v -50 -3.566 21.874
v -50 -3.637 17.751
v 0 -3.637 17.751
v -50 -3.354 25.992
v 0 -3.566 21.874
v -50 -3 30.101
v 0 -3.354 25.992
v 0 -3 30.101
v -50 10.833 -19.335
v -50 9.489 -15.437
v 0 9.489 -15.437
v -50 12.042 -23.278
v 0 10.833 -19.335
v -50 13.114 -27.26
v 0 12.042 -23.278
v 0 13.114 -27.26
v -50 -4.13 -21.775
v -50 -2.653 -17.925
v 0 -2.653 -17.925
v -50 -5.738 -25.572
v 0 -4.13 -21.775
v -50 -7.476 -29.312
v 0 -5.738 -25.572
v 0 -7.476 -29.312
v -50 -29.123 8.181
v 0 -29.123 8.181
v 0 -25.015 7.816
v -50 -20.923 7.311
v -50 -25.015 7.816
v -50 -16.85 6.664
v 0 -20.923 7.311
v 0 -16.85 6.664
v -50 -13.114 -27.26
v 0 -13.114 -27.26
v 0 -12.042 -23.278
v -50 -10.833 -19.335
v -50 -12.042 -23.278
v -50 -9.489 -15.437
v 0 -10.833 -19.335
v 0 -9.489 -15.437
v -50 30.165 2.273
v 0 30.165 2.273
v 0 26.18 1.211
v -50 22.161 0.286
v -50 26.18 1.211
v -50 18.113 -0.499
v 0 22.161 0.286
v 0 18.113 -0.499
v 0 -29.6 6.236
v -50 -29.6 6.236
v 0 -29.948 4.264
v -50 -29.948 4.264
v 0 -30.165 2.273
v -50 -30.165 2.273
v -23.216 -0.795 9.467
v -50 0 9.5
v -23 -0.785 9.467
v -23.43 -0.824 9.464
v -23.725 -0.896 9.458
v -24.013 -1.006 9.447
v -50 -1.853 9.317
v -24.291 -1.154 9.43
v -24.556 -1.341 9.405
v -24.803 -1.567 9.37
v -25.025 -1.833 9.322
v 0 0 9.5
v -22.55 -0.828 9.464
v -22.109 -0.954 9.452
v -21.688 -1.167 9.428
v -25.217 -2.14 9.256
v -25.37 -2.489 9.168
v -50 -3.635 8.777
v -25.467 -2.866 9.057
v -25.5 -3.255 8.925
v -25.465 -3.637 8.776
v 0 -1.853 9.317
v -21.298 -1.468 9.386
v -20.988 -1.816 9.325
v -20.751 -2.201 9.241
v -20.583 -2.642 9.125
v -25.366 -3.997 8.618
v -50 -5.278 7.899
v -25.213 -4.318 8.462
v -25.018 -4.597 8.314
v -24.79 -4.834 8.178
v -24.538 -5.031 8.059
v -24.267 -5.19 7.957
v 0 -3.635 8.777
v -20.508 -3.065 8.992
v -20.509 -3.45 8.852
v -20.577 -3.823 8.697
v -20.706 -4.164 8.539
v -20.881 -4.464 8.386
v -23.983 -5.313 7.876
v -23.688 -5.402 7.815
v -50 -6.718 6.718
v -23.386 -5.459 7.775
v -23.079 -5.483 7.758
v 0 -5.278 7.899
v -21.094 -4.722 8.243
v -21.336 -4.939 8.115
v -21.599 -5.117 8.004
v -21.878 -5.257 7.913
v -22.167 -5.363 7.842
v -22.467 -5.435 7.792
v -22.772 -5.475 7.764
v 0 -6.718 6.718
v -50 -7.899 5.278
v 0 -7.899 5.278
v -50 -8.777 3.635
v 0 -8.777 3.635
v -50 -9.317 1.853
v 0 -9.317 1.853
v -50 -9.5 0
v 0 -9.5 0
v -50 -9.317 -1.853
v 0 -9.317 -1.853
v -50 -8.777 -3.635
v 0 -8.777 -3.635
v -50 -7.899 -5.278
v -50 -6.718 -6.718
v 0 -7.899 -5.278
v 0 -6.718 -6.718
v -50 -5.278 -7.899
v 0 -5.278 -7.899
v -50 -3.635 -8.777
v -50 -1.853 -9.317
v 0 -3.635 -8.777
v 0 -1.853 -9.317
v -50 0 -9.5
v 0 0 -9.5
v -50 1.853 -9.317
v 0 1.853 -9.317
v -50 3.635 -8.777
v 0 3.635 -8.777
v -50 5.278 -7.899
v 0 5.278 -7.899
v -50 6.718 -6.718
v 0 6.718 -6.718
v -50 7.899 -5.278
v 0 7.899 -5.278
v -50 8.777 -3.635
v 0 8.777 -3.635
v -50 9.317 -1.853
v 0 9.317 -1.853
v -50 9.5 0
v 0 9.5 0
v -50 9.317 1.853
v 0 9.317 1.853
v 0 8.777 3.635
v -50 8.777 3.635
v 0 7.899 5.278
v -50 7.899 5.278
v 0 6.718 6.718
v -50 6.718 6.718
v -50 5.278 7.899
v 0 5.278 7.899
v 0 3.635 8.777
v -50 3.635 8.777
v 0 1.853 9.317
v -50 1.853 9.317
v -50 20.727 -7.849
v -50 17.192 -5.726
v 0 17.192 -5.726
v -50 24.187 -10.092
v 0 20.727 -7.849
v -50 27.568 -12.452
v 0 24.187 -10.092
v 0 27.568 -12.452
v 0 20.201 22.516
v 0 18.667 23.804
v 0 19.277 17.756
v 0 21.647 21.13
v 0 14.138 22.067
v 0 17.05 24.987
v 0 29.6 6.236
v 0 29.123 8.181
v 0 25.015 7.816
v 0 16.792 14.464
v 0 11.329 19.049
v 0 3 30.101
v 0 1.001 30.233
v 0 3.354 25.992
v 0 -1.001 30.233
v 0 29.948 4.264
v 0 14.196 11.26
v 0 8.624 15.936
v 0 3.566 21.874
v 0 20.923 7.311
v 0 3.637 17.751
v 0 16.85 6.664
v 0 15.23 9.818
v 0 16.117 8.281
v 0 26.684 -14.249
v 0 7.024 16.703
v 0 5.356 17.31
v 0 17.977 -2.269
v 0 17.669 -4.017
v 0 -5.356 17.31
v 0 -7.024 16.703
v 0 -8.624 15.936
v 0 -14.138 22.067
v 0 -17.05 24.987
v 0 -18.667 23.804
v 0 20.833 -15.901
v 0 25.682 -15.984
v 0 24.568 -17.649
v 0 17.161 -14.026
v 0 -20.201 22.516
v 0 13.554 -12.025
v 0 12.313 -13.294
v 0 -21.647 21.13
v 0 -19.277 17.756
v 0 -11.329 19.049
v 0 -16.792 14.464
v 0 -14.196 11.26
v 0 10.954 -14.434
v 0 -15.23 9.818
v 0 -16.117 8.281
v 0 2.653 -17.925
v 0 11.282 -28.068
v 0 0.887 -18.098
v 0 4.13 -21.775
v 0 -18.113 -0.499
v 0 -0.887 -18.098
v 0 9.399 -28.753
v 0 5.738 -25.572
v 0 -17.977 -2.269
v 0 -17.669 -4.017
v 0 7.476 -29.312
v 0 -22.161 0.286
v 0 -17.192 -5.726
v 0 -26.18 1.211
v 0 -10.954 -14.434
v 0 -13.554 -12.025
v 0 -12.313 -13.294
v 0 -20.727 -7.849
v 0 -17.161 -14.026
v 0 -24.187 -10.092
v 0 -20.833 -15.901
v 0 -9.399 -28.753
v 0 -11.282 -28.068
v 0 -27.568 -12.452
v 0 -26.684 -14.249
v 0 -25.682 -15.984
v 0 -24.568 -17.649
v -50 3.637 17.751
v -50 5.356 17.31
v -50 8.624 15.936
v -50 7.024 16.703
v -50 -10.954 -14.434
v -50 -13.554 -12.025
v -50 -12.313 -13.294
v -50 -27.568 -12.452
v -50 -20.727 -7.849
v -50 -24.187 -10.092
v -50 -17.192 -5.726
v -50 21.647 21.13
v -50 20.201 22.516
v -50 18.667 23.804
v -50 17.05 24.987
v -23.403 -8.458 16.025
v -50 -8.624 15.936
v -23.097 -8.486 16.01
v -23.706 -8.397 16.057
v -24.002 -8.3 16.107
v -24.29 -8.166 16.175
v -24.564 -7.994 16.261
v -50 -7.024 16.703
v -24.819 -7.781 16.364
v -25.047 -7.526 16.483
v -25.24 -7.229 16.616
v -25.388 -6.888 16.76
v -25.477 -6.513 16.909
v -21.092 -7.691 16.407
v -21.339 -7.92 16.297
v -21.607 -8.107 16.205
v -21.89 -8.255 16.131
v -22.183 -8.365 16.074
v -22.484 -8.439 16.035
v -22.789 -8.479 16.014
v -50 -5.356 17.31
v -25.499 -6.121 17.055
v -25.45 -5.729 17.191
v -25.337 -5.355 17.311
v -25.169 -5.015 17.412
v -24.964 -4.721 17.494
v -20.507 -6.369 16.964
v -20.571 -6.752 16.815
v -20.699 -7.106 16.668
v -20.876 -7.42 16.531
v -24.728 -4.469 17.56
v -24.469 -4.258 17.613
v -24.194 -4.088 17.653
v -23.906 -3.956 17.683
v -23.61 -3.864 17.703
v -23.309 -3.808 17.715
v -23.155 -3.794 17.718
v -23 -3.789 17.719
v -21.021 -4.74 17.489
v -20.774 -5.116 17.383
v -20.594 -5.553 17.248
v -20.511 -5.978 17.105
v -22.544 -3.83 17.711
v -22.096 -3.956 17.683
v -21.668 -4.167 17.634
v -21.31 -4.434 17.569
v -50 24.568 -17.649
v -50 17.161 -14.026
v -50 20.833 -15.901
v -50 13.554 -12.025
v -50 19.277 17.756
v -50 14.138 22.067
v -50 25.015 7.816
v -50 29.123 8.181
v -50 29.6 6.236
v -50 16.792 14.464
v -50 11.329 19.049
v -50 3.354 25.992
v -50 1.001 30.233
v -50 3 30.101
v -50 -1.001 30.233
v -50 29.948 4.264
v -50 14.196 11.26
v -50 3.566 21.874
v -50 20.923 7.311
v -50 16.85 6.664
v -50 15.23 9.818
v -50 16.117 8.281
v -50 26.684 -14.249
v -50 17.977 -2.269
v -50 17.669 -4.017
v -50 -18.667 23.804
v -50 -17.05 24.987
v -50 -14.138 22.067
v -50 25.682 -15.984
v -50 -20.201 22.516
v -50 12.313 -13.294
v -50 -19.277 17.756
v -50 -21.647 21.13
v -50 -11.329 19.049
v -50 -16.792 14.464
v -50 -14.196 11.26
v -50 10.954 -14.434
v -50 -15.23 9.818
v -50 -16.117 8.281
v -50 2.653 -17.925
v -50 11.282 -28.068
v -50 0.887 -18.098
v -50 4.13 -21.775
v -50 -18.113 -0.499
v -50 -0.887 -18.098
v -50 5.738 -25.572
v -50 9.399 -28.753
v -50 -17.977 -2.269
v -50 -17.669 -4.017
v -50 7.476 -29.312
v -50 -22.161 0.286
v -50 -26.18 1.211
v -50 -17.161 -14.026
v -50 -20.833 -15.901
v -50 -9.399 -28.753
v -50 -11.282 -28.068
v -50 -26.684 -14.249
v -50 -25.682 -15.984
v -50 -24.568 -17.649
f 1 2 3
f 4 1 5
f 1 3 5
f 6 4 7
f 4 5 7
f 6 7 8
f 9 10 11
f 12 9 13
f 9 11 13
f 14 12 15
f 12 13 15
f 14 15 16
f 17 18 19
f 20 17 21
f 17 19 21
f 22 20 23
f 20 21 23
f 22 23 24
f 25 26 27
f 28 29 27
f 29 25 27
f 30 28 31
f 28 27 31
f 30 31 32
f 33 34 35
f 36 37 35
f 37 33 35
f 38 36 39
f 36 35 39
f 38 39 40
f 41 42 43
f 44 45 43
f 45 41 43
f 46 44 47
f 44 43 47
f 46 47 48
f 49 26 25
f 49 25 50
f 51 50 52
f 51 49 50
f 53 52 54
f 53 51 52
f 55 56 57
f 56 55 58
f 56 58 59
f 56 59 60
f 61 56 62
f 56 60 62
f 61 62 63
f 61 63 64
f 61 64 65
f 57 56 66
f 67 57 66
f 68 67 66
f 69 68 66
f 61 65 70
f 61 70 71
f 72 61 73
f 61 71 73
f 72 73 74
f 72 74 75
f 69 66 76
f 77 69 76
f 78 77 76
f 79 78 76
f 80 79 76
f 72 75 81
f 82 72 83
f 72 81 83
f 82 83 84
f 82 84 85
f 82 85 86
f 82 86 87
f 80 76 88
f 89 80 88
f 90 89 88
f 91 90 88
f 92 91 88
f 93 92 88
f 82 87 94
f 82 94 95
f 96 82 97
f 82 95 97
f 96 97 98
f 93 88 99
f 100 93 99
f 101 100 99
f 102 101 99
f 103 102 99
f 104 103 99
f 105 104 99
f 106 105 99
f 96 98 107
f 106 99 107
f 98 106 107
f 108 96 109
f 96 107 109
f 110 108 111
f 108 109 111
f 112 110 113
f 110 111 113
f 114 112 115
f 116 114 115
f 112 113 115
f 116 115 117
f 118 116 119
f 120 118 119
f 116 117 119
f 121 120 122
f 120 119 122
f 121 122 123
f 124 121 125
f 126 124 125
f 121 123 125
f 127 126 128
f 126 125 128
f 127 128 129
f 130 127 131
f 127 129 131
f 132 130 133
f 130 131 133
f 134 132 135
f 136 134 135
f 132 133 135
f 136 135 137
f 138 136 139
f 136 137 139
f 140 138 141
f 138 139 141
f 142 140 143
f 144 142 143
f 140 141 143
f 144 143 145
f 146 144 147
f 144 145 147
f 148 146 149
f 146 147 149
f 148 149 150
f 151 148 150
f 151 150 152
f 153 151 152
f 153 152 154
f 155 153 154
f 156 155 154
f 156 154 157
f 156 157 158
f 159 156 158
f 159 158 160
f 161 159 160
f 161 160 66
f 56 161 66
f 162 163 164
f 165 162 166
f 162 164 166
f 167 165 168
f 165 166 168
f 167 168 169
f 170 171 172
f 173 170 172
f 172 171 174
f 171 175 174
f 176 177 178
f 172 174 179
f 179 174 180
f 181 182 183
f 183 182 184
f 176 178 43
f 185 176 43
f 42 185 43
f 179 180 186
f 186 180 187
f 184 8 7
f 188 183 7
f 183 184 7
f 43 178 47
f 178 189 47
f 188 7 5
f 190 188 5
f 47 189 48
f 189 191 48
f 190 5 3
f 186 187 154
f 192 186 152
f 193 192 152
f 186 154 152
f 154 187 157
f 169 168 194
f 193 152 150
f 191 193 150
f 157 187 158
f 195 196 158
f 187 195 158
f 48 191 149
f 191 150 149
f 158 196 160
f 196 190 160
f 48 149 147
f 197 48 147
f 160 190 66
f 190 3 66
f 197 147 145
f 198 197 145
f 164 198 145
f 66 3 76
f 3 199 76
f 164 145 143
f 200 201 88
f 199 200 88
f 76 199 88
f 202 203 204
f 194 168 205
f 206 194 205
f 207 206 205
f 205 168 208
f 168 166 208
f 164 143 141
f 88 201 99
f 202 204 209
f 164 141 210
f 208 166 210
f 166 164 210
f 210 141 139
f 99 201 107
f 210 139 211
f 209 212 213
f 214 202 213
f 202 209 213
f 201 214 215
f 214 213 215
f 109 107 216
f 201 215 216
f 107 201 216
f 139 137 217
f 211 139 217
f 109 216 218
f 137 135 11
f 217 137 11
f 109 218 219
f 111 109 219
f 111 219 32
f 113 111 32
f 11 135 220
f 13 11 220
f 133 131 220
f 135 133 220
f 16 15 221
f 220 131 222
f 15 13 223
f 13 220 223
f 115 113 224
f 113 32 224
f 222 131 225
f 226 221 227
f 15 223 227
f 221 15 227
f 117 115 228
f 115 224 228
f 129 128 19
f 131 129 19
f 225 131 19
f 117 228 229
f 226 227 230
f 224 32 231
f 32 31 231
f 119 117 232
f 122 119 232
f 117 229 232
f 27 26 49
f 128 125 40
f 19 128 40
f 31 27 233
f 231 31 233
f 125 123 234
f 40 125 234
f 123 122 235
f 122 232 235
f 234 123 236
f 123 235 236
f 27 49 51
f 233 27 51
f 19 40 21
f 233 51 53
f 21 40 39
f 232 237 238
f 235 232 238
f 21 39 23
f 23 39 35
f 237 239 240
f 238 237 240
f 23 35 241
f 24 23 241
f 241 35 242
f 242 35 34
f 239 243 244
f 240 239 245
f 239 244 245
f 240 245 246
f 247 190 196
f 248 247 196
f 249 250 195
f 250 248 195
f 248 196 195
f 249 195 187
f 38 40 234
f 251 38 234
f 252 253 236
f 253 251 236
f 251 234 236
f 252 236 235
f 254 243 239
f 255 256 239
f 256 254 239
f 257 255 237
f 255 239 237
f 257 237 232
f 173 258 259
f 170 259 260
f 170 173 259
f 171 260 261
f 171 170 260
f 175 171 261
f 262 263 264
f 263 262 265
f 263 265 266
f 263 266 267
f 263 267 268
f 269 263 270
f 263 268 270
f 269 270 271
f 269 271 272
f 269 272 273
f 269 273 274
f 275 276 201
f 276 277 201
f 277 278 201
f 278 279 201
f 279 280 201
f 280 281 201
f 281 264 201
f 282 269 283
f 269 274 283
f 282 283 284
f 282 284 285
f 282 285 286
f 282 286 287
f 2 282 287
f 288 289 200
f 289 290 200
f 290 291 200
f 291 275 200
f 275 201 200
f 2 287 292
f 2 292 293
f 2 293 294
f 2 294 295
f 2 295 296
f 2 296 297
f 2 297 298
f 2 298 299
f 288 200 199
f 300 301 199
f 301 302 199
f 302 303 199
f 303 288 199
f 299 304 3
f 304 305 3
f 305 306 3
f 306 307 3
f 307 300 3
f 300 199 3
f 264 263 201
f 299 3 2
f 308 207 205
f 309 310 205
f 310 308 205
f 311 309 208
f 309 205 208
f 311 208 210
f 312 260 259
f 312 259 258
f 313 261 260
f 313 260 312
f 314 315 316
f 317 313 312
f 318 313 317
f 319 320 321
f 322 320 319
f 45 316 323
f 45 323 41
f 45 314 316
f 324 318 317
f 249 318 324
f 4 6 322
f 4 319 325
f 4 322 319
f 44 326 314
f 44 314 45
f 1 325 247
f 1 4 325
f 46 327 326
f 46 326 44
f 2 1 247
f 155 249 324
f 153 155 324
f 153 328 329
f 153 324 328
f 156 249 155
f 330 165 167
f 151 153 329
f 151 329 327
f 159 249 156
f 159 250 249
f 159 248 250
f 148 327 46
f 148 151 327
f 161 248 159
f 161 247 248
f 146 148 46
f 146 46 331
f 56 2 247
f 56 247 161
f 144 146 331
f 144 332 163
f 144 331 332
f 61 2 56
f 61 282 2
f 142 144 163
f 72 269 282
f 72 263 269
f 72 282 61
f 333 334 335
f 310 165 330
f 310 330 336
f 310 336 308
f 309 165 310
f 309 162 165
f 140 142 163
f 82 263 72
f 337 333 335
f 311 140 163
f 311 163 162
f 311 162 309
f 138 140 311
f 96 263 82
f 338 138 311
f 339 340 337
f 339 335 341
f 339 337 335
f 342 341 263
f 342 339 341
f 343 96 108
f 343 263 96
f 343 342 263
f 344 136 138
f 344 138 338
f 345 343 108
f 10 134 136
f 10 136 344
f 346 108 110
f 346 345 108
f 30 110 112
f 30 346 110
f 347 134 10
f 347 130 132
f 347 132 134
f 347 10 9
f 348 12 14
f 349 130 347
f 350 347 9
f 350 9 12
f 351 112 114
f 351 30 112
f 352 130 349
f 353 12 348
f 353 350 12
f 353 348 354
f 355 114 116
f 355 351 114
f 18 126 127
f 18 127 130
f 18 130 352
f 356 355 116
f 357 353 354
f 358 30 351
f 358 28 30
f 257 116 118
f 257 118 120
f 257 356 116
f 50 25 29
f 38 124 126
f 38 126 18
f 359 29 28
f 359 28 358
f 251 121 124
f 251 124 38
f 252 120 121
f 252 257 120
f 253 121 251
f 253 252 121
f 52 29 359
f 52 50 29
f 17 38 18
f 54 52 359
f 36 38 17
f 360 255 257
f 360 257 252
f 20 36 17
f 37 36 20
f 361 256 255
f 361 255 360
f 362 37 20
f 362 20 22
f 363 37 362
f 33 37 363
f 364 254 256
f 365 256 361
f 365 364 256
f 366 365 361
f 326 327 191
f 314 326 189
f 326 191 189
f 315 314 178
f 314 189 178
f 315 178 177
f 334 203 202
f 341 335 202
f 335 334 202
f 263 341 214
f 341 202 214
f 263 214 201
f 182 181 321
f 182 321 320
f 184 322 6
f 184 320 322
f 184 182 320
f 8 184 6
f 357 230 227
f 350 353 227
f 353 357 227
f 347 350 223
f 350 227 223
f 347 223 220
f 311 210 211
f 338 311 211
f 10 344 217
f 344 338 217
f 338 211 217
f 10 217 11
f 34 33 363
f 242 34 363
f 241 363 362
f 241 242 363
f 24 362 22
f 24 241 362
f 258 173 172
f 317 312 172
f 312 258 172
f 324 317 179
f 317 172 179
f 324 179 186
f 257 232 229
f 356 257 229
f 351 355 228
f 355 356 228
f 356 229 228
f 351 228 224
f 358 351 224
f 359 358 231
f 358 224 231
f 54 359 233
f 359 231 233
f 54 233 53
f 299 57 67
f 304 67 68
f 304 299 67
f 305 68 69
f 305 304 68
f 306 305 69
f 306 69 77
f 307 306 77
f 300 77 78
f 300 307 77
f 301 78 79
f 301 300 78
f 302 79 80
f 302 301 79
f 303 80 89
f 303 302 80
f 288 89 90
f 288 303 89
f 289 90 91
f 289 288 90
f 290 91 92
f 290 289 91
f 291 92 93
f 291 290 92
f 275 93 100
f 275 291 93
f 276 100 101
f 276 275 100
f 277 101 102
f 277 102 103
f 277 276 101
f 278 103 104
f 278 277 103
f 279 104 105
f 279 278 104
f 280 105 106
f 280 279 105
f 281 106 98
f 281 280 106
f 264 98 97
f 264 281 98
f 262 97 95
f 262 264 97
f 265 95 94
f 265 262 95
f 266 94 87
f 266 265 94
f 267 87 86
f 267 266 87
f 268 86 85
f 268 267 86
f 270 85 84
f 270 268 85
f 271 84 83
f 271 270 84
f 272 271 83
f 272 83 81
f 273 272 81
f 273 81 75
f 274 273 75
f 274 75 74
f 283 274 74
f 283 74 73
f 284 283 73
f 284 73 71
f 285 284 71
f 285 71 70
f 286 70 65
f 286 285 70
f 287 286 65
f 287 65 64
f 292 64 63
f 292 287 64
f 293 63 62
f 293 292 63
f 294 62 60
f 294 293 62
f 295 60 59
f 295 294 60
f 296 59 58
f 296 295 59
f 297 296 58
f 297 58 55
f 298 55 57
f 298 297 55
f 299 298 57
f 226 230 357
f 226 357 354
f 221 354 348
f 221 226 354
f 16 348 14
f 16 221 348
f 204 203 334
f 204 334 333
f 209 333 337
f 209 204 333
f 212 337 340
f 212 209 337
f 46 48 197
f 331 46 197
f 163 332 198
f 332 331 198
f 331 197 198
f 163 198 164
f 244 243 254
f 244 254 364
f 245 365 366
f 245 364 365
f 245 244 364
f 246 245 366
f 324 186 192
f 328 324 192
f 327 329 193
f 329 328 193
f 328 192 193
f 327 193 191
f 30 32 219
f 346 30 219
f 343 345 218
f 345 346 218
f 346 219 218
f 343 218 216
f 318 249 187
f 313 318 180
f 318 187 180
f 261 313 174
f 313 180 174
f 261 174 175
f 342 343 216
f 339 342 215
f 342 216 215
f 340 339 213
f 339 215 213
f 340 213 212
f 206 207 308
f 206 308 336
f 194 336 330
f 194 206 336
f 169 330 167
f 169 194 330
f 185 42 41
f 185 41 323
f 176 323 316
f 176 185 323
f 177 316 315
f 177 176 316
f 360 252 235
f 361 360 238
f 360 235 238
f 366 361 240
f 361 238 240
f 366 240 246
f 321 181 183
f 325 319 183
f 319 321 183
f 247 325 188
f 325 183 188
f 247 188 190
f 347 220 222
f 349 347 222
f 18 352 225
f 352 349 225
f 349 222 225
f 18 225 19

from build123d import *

# Parameters (mm, degrees)
F0_W     = 50
F0_H     = 20.75
F3_DEPTH = 50.001
F4_COUNT = 9


with BuildPart() as f1:
    # F0 (on Front) → F1 (revolve)
    with BuildSketch(Plane.XZ):
        with Locations((-25, 19.875)):
            Rectangle(F0_W, F0_H)
    revolve(axis=Axis((-20.0732499361, 0, 0), (1, 0, 0)))

    # F2 (on face) → F3 (cut, through all)
    with BuildSketch(Plane.YZ):
        with BuildLine():
            ThreePointArc((-8.6240252272, 15.9361409658), (-6.1974049971, 17.0272302886), (-3.6371673564, 17.7512087932))
            ThreePointArc((-3.6371673564, 17.7512087932), (-3.4777696522, 23.9342534629), (-3, 30.1008720804))
            ThreePointArc((-3, 30.1008720804), (-10.3461093356, 28.4257017788), (-17.0503342847, 24.9869686193))
            ThreePointArc((-17.0503342847, 24.9869686193), (-12.7205154565, 20.5701691072), (-8.6240252272, 15.9361409658))
        make_face()
    f3 = extrude(amount=-F3_DEPTH, mode=Mode.SUBTRACT)

    # F4: F3 ×9 about axis
    f4_axis = Axis((-20.0732499361, 0, 0), (1, 0, 0))
    for i in range(1, F4_COUNT):
        add(f3.rotate(f4_axis, i * 360 / F4_COUNT), mode=Mode.SUBTRACT)

    # F6 (on offset) → F7 (revolve, cut)
    with BuildSketch(Plane.YZ.offset(-23)):
        Polygon((-4.5322137317, 19.7616658885), (-6.8814452837, 18.9066155302), (-2.7772035638, 7.6303040808), (-0.4279720118, 8.4853544391), align=None)
    revolve(axis=Axis((-23, -3.7938283898, 10.4234578343), (0, 0.3420201433, -0.9396926208)), mode=Mode.SUBTRACT)


solid = f1.part
